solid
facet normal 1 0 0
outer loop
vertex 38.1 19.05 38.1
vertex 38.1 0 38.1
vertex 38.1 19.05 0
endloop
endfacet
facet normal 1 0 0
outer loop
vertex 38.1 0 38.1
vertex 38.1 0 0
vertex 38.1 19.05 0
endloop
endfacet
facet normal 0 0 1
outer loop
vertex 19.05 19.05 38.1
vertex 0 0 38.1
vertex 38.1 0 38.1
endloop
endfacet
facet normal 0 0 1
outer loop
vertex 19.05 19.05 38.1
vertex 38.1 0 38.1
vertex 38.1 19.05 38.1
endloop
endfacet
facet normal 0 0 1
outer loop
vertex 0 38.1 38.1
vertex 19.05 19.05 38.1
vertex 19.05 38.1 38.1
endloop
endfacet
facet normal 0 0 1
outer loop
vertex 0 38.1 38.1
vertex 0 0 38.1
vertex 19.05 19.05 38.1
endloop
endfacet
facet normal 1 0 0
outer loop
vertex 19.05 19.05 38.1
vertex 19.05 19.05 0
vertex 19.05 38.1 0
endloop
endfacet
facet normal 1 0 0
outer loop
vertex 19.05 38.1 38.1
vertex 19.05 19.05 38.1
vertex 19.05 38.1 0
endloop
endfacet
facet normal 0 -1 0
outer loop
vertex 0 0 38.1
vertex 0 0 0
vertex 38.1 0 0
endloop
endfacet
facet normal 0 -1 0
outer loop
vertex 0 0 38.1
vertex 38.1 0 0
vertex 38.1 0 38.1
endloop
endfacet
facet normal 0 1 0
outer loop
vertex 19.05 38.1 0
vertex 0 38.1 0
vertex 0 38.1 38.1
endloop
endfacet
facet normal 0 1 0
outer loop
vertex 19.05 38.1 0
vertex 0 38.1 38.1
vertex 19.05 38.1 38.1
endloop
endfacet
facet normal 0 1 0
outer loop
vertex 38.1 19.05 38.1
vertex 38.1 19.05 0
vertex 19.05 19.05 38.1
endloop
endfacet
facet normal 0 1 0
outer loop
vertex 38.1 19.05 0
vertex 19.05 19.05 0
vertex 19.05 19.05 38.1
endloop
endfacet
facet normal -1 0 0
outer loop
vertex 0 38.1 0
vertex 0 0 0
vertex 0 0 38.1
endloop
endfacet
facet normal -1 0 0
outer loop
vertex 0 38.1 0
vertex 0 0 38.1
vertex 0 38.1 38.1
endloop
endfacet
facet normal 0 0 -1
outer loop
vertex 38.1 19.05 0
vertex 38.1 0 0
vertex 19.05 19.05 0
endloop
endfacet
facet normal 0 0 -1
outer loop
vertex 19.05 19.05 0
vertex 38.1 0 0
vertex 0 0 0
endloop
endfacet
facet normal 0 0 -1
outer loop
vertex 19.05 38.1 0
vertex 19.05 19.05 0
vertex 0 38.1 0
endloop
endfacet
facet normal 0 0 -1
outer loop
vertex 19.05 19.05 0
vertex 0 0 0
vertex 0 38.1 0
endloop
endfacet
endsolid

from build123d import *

# Parameters (mm, degrees)
F0_W     = 19.05
F0_H     = 19.05
F1_DEPTH = 19.05
F2_DEPTH = 19.05
F4_W     = 19.05
F4_H     = 19.05
F5_DEPTH = 19.05
F3_W     = 19.05
F3_H     = 19.05
F6_DEPTH = 19.05
F7_DEPTH = 19.05
F8_DEPTH = 19.05


with BuildPart() as f1:
    # F0 (on Top) → F1 (new body)
    with BuildSketch(Plane.XY):
        with Locations((9.525, 9.525)):
            Rectangle(F0_W, F0_H)
    extrude(amount=F1_DEPTH)

    # F2 (add): a face of the model
    f2_faces = [f1.faces().sort_by_distance(p)[0] for p in [
        (9.525, 19.05, 9.525),
    ]]
    extrude(f2_faces, amount=F2_DEPTH)

    # F4 (on face) → F5 (join)
    with BuildSketch(Plane.YZ.offset(19.05)):
        with Locations((9.525, 9.525)):
            Rectangle(F4_W, F4_H)
    extrude(amount=F5_DEPTH)

    # F3 (on face) → F6 (join)
    with BuildSketch(Plane.XY.offset(19.05)):
        with Locations((9.525, 9.525)):
            Rectangle(F3_W, F3_H)
    extrude(amount=F6_DEPTH)

    # F7 (add): a face of the model
    f7_faces = [f1.faces().sort_by_distance(p)[0] for p in [
        (19.05, 9.525, 28.575),
    ]]
    extrude(f7_faces, amount=F7_DEPTH)

    # F8 (add): a face of the model
    f8_faces = [f1.faces().sort_by_distance(p)[0] for p in [
        (9.525, 28.575, 19.05),
    ]]
    extrude(f8_faces, amount=F8_DEPTH)


solid = f1.part
